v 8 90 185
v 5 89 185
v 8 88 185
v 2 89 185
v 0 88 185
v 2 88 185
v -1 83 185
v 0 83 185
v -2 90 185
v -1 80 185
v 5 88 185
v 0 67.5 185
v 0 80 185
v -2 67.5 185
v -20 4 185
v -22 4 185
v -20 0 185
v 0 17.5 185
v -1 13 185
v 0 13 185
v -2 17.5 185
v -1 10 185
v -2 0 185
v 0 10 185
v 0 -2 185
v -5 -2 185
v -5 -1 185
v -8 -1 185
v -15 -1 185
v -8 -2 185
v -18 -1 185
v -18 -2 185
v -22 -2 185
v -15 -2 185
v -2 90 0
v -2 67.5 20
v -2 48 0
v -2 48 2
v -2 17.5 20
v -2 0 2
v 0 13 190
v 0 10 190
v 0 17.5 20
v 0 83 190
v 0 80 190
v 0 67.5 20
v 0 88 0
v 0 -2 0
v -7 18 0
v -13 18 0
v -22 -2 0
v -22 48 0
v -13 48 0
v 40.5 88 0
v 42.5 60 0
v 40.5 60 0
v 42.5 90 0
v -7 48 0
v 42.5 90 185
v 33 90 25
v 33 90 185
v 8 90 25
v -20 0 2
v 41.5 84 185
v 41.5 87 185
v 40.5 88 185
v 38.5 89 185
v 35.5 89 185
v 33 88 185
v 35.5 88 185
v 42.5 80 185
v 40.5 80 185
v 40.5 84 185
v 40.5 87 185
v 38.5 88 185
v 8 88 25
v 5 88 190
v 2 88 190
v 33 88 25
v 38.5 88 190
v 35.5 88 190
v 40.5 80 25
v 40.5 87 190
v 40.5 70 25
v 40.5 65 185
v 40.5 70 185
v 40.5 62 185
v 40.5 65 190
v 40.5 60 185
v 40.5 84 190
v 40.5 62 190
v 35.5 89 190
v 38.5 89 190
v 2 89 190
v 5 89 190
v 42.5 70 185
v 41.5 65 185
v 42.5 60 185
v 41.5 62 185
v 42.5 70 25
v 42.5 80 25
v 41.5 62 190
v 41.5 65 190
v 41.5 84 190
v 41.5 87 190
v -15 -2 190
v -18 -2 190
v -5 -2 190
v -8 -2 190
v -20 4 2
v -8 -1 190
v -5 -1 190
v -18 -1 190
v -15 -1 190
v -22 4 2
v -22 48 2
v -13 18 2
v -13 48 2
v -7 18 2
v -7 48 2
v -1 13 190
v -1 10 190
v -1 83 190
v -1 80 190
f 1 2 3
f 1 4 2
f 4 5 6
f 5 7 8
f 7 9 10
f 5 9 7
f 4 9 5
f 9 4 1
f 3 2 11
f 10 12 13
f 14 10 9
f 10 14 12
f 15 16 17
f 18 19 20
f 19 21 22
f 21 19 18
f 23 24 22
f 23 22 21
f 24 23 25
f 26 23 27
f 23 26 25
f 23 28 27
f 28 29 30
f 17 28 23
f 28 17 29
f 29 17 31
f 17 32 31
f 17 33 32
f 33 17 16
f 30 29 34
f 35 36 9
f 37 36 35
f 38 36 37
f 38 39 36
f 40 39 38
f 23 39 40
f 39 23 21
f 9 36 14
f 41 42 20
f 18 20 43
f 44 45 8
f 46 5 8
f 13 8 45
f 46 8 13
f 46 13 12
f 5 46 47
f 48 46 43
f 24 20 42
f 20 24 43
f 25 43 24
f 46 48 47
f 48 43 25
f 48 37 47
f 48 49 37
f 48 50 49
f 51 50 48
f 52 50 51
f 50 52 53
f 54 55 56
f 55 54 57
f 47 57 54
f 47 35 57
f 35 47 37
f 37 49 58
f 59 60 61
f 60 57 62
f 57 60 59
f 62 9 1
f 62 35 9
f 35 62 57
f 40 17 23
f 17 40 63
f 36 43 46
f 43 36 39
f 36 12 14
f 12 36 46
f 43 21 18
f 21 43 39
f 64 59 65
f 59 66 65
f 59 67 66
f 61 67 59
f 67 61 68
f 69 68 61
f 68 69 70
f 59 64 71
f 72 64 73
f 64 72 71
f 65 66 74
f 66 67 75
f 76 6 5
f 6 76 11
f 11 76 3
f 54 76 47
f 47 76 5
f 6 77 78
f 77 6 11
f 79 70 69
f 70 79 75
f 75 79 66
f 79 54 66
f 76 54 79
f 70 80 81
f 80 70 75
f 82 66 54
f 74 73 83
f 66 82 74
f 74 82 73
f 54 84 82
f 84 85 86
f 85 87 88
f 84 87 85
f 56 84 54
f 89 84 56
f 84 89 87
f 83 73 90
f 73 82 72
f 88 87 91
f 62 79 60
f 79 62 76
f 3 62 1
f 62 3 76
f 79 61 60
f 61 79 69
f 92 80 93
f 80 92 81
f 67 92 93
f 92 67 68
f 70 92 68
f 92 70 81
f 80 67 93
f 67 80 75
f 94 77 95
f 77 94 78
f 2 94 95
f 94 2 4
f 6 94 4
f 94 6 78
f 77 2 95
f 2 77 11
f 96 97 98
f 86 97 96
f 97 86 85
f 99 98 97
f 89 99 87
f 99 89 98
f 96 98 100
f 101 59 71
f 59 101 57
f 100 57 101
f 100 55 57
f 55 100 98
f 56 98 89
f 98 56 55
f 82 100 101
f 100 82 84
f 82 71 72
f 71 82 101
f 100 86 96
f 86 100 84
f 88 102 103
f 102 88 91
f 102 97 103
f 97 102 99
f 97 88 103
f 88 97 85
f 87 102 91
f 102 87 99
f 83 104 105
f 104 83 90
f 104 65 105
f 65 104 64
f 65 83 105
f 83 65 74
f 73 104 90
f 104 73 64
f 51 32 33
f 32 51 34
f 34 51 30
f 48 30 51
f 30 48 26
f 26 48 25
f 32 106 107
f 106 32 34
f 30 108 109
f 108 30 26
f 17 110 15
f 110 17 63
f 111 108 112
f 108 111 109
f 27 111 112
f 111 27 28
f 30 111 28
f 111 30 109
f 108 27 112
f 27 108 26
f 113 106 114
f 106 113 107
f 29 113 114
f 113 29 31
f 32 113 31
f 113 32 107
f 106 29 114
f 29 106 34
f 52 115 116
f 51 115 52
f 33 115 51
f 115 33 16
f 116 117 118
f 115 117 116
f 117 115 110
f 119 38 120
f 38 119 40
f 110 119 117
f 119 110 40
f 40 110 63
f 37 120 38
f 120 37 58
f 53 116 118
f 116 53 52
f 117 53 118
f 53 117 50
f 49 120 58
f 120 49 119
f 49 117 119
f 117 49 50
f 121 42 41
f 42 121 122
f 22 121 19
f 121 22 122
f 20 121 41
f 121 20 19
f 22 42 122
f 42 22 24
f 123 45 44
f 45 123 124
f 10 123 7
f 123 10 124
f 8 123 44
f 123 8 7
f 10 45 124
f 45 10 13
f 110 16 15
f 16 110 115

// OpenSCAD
rotate([0, -90, 0]){

    //spacers
    difference() {
            //main plate
            cube([185, 90, 2]);
            //for(space=[0:10]) {
                //translate([25, 10 * space, 0]) {
                    translate([20, 17.5, 0]) cube([165, 50, 2]);
                //}
            //}
    }
    translate([185, 10, 0]) cube([5, 3, 1]);
    translate([185, 80, 0]) cube([5, 3, 1]);

    //top connector
    translate([0, 90, -40.5]){
        rotate([90, 0, 0]) {
            union() {
                difference() {
                    cube([185, 40.5, 2]);
                    translate([25, 7.5, 0]) cube([165, 25, 2]);
                }
                translate([185, 2, 1]) cube([5, 3, 1]);
                translate([185, 35.5, 1]) cube([5, 3, 1]);
        }
        }
    }
            
    //back clip        
    translate([0, 60, -42.5]) {
        difference() {
            cube([185, 30, 2]);
            translate([25, 10, 0]) cube([165, 10, 2]);
        }
        translate([185, 2, 1]) cube([5, 3, 1]);
        translate([185, 24, 1]) cube([5, 3, 1]);
    }
        
    //bottom bracket
    //translate([0, 90, 0])
        rotate([90, 0, 0]) {
            cube([185, 20, 2]);
            translate([185, 5, 1]) cube([5, 3, 1]);
            translate([185, 15, 1]) cube([5, 3, 1]);
        }

    //bottom lip
    translate([0, -2, 20])
        cube([185, 6, 2]);

    //cord holder
    translate([2, -2, 0]) {
    //translate([2, 38, 0]) {    
        rotate([0, -90, 0]) {
            difference() {
                cube([22, 50, 2]);
                translate([7, 20, 0])              cube([6, 30, 2]);
            }
        }
    //}
    }

}
